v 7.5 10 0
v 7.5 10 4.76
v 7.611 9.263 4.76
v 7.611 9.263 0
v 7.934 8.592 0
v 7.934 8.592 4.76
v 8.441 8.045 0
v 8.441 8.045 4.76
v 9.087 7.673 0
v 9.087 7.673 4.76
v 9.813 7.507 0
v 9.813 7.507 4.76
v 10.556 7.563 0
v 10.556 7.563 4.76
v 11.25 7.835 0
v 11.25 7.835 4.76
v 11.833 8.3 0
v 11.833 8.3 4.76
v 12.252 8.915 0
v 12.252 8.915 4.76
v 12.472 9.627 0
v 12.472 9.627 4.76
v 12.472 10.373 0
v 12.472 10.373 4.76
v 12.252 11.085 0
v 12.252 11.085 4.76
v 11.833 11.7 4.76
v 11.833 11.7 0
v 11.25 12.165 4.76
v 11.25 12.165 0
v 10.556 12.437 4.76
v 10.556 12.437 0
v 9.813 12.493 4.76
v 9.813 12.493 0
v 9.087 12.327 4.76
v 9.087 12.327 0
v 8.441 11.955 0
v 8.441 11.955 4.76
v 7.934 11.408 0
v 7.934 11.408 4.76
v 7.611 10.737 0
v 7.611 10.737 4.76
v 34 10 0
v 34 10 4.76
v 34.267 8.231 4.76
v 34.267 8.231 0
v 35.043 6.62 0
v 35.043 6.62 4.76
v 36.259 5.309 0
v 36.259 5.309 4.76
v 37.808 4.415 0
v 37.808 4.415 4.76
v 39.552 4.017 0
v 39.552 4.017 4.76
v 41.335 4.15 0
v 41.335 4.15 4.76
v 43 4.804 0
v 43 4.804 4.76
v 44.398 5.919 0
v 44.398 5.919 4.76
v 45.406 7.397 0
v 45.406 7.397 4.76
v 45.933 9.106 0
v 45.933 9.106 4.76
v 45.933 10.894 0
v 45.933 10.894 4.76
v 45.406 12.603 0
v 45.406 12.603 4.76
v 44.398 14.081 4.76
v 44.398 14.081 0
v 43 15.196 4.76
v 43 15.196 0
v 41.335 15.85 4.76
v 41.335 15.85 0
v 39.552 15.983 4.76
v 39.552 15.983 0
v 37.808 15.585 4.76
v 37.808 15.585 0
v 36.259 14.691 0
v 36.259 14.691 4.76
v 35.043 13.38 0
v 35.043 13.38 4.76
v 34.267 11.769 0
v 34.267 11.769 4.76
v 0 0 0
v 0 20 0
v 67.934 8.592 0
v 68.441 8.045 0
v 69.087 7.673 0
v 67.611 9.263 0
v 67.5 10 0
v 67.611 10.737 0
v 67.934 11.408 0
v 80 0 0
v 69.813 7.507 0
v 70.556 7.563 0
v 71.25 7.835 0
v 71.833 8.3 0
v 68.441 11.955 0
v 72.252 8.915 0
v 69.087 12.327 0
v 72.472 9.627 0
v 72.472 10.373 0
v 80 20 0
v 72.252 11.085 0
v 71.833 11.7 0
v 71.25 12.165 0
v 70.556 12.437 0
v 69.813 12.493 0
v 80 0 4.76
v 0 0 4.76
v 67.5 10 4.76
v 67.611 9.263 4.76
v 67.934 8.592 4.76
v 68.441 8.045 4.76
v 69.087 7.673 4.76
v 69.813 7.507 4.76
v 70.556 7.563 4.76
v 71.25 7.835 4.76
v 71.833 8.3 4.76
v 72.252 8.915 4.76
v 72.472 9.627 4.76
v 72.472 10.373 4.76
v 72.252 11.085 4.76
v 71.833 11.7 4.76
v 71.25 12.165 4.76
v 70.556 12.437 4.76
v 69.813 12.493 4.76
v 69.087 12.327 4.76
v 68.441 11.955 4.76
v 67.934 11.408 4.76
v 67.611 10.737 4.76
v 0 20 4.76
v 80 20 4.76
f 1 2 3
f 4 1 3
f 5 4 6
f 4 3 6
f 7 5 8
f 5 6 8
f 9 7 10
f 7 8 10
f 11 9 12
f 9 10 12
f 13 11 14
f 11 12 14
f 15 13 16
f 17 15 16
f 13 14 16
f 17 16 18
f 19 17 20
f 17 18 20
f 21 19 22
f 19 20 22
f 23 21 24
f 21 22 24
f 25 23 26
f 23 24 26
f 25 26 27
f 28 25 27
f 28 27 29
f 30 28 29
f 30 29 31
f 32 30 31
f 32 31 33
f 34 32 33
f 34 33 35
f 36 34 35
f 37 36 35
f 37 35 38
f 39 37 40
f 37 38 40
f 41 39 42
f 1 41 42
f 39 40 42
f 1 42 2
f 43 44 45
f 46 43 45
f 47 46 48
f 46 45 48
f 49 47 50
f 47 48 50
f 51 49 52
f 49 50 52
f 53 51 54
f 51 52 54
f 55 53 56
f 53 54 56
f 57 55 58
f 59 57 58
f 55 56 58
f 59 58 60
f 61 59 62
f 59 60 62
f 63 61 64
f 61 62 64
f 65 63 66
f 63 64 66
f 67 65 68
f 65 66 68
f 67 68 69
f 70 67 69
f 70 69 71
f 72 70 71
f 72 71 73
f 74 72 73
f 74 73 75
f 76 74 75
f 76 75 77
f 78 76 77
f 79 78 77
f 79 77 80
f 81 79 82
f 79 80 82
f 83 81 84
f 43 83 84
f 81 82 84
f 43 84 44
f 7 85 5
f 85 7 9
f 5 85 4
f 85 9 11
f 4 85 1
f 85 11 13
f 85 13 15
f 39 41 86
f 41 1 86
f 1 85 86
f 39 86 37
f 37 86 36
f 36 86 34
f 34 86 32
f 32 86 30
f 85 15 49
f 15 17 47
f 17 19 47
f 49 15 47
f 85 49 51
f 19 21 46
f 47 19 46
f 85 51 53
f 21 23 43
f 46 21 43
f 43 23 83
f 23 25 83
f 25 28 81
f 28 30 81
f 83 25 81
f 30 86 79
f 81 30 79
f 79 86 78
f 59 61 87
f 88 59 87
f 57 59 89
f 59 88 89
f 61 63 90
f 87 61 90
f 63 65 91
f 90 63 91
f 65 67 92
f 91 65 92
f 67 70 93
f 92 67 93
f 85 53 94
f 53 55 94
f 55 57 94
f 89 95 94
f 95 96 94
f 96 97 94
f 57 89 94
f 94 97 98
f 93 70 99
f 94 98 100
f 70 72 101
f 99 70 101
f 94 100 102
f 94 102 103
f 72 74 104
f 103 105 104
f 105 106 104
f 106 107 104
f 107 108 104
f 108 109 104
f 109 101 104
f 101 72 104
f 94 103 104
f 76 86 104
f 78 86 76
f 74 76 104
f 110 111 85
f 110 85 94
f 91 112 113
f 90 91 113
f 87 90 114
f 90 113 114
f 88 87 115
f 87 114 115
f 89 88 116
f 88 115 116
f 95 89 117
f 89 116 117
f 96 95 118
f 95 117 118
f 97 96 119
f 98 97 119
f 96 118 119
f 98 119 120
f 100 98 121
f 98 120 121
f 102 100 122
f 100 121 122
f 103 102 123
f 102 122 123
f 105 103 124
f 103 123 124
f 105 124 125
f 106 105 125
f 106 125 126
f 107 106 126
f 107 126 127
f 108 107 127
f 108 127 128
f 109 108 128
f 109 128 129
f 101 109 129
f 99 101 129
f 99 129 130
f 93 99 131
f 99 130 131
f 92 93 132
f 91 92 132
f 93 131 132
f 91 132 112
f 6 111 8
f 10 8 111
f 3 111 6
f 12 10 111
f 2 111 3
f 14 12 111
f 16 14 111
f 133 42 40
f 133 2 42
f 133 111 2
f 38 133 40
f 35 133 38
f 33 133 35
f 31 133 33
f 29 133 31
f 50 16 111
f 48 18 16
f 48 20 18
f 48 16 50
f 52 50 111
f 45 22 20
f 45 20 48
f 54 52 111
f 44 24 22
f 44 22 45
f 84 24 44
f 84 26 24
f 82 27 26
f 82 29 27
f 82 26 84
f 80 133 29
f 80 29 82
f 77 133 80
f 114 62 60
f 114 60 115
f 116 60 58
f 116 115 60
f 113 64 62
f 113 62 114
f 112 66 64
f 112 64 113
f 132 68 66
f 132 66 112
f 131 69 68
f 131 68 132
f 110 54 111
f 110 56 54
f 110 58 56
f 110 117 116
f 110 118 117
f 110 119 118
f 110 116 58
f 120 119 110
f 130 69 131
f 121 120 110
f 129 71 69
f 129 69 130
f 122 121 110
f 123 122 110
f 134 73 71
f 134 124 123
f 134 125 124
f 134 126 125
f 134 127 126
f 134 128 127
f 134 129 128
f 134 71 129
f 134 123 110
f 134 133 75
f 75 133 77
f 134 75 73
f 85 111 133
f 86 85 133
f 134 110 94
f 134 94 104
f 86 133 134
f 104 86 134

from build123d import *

# Parameters (mm, degrees)
SKETCH1_W           = 80
SKETCH1_H           = 20
SKETCH1_R           = 2.5
SKETCH1_R_2         = 6
BOSS_EXTRUDE1_DEPTH = 4.76


with BuildPart() as part:
    # Sketch1 → Boss-Extrude1 (new body)
    with BuildSketch(Plane.XY.offset(4.76)):
        with Locations((40, 10)):
            Rectangle(SKETCH1_W, SKETCH1_H)
        with Locations(Location((10, 10, 0), (0, 0, 180))):
            Circle(SKETCH1_R, mode=Mode.SUBTRACT)
        with Locations(Location((70, 10, 0), (0, 0, 180))):
            Circle(SKETCH1_R, mode=Mode.SUBTRACT)
        with Locations(Location((40, 10, 0), (0, 0, 180))):
            Circle(SKETCH1_R_2, mode=Mode.SUBTRACT)
    extrude(amount=-BOSS_EXTRUDE1_DEPTH)


solid = part.part
